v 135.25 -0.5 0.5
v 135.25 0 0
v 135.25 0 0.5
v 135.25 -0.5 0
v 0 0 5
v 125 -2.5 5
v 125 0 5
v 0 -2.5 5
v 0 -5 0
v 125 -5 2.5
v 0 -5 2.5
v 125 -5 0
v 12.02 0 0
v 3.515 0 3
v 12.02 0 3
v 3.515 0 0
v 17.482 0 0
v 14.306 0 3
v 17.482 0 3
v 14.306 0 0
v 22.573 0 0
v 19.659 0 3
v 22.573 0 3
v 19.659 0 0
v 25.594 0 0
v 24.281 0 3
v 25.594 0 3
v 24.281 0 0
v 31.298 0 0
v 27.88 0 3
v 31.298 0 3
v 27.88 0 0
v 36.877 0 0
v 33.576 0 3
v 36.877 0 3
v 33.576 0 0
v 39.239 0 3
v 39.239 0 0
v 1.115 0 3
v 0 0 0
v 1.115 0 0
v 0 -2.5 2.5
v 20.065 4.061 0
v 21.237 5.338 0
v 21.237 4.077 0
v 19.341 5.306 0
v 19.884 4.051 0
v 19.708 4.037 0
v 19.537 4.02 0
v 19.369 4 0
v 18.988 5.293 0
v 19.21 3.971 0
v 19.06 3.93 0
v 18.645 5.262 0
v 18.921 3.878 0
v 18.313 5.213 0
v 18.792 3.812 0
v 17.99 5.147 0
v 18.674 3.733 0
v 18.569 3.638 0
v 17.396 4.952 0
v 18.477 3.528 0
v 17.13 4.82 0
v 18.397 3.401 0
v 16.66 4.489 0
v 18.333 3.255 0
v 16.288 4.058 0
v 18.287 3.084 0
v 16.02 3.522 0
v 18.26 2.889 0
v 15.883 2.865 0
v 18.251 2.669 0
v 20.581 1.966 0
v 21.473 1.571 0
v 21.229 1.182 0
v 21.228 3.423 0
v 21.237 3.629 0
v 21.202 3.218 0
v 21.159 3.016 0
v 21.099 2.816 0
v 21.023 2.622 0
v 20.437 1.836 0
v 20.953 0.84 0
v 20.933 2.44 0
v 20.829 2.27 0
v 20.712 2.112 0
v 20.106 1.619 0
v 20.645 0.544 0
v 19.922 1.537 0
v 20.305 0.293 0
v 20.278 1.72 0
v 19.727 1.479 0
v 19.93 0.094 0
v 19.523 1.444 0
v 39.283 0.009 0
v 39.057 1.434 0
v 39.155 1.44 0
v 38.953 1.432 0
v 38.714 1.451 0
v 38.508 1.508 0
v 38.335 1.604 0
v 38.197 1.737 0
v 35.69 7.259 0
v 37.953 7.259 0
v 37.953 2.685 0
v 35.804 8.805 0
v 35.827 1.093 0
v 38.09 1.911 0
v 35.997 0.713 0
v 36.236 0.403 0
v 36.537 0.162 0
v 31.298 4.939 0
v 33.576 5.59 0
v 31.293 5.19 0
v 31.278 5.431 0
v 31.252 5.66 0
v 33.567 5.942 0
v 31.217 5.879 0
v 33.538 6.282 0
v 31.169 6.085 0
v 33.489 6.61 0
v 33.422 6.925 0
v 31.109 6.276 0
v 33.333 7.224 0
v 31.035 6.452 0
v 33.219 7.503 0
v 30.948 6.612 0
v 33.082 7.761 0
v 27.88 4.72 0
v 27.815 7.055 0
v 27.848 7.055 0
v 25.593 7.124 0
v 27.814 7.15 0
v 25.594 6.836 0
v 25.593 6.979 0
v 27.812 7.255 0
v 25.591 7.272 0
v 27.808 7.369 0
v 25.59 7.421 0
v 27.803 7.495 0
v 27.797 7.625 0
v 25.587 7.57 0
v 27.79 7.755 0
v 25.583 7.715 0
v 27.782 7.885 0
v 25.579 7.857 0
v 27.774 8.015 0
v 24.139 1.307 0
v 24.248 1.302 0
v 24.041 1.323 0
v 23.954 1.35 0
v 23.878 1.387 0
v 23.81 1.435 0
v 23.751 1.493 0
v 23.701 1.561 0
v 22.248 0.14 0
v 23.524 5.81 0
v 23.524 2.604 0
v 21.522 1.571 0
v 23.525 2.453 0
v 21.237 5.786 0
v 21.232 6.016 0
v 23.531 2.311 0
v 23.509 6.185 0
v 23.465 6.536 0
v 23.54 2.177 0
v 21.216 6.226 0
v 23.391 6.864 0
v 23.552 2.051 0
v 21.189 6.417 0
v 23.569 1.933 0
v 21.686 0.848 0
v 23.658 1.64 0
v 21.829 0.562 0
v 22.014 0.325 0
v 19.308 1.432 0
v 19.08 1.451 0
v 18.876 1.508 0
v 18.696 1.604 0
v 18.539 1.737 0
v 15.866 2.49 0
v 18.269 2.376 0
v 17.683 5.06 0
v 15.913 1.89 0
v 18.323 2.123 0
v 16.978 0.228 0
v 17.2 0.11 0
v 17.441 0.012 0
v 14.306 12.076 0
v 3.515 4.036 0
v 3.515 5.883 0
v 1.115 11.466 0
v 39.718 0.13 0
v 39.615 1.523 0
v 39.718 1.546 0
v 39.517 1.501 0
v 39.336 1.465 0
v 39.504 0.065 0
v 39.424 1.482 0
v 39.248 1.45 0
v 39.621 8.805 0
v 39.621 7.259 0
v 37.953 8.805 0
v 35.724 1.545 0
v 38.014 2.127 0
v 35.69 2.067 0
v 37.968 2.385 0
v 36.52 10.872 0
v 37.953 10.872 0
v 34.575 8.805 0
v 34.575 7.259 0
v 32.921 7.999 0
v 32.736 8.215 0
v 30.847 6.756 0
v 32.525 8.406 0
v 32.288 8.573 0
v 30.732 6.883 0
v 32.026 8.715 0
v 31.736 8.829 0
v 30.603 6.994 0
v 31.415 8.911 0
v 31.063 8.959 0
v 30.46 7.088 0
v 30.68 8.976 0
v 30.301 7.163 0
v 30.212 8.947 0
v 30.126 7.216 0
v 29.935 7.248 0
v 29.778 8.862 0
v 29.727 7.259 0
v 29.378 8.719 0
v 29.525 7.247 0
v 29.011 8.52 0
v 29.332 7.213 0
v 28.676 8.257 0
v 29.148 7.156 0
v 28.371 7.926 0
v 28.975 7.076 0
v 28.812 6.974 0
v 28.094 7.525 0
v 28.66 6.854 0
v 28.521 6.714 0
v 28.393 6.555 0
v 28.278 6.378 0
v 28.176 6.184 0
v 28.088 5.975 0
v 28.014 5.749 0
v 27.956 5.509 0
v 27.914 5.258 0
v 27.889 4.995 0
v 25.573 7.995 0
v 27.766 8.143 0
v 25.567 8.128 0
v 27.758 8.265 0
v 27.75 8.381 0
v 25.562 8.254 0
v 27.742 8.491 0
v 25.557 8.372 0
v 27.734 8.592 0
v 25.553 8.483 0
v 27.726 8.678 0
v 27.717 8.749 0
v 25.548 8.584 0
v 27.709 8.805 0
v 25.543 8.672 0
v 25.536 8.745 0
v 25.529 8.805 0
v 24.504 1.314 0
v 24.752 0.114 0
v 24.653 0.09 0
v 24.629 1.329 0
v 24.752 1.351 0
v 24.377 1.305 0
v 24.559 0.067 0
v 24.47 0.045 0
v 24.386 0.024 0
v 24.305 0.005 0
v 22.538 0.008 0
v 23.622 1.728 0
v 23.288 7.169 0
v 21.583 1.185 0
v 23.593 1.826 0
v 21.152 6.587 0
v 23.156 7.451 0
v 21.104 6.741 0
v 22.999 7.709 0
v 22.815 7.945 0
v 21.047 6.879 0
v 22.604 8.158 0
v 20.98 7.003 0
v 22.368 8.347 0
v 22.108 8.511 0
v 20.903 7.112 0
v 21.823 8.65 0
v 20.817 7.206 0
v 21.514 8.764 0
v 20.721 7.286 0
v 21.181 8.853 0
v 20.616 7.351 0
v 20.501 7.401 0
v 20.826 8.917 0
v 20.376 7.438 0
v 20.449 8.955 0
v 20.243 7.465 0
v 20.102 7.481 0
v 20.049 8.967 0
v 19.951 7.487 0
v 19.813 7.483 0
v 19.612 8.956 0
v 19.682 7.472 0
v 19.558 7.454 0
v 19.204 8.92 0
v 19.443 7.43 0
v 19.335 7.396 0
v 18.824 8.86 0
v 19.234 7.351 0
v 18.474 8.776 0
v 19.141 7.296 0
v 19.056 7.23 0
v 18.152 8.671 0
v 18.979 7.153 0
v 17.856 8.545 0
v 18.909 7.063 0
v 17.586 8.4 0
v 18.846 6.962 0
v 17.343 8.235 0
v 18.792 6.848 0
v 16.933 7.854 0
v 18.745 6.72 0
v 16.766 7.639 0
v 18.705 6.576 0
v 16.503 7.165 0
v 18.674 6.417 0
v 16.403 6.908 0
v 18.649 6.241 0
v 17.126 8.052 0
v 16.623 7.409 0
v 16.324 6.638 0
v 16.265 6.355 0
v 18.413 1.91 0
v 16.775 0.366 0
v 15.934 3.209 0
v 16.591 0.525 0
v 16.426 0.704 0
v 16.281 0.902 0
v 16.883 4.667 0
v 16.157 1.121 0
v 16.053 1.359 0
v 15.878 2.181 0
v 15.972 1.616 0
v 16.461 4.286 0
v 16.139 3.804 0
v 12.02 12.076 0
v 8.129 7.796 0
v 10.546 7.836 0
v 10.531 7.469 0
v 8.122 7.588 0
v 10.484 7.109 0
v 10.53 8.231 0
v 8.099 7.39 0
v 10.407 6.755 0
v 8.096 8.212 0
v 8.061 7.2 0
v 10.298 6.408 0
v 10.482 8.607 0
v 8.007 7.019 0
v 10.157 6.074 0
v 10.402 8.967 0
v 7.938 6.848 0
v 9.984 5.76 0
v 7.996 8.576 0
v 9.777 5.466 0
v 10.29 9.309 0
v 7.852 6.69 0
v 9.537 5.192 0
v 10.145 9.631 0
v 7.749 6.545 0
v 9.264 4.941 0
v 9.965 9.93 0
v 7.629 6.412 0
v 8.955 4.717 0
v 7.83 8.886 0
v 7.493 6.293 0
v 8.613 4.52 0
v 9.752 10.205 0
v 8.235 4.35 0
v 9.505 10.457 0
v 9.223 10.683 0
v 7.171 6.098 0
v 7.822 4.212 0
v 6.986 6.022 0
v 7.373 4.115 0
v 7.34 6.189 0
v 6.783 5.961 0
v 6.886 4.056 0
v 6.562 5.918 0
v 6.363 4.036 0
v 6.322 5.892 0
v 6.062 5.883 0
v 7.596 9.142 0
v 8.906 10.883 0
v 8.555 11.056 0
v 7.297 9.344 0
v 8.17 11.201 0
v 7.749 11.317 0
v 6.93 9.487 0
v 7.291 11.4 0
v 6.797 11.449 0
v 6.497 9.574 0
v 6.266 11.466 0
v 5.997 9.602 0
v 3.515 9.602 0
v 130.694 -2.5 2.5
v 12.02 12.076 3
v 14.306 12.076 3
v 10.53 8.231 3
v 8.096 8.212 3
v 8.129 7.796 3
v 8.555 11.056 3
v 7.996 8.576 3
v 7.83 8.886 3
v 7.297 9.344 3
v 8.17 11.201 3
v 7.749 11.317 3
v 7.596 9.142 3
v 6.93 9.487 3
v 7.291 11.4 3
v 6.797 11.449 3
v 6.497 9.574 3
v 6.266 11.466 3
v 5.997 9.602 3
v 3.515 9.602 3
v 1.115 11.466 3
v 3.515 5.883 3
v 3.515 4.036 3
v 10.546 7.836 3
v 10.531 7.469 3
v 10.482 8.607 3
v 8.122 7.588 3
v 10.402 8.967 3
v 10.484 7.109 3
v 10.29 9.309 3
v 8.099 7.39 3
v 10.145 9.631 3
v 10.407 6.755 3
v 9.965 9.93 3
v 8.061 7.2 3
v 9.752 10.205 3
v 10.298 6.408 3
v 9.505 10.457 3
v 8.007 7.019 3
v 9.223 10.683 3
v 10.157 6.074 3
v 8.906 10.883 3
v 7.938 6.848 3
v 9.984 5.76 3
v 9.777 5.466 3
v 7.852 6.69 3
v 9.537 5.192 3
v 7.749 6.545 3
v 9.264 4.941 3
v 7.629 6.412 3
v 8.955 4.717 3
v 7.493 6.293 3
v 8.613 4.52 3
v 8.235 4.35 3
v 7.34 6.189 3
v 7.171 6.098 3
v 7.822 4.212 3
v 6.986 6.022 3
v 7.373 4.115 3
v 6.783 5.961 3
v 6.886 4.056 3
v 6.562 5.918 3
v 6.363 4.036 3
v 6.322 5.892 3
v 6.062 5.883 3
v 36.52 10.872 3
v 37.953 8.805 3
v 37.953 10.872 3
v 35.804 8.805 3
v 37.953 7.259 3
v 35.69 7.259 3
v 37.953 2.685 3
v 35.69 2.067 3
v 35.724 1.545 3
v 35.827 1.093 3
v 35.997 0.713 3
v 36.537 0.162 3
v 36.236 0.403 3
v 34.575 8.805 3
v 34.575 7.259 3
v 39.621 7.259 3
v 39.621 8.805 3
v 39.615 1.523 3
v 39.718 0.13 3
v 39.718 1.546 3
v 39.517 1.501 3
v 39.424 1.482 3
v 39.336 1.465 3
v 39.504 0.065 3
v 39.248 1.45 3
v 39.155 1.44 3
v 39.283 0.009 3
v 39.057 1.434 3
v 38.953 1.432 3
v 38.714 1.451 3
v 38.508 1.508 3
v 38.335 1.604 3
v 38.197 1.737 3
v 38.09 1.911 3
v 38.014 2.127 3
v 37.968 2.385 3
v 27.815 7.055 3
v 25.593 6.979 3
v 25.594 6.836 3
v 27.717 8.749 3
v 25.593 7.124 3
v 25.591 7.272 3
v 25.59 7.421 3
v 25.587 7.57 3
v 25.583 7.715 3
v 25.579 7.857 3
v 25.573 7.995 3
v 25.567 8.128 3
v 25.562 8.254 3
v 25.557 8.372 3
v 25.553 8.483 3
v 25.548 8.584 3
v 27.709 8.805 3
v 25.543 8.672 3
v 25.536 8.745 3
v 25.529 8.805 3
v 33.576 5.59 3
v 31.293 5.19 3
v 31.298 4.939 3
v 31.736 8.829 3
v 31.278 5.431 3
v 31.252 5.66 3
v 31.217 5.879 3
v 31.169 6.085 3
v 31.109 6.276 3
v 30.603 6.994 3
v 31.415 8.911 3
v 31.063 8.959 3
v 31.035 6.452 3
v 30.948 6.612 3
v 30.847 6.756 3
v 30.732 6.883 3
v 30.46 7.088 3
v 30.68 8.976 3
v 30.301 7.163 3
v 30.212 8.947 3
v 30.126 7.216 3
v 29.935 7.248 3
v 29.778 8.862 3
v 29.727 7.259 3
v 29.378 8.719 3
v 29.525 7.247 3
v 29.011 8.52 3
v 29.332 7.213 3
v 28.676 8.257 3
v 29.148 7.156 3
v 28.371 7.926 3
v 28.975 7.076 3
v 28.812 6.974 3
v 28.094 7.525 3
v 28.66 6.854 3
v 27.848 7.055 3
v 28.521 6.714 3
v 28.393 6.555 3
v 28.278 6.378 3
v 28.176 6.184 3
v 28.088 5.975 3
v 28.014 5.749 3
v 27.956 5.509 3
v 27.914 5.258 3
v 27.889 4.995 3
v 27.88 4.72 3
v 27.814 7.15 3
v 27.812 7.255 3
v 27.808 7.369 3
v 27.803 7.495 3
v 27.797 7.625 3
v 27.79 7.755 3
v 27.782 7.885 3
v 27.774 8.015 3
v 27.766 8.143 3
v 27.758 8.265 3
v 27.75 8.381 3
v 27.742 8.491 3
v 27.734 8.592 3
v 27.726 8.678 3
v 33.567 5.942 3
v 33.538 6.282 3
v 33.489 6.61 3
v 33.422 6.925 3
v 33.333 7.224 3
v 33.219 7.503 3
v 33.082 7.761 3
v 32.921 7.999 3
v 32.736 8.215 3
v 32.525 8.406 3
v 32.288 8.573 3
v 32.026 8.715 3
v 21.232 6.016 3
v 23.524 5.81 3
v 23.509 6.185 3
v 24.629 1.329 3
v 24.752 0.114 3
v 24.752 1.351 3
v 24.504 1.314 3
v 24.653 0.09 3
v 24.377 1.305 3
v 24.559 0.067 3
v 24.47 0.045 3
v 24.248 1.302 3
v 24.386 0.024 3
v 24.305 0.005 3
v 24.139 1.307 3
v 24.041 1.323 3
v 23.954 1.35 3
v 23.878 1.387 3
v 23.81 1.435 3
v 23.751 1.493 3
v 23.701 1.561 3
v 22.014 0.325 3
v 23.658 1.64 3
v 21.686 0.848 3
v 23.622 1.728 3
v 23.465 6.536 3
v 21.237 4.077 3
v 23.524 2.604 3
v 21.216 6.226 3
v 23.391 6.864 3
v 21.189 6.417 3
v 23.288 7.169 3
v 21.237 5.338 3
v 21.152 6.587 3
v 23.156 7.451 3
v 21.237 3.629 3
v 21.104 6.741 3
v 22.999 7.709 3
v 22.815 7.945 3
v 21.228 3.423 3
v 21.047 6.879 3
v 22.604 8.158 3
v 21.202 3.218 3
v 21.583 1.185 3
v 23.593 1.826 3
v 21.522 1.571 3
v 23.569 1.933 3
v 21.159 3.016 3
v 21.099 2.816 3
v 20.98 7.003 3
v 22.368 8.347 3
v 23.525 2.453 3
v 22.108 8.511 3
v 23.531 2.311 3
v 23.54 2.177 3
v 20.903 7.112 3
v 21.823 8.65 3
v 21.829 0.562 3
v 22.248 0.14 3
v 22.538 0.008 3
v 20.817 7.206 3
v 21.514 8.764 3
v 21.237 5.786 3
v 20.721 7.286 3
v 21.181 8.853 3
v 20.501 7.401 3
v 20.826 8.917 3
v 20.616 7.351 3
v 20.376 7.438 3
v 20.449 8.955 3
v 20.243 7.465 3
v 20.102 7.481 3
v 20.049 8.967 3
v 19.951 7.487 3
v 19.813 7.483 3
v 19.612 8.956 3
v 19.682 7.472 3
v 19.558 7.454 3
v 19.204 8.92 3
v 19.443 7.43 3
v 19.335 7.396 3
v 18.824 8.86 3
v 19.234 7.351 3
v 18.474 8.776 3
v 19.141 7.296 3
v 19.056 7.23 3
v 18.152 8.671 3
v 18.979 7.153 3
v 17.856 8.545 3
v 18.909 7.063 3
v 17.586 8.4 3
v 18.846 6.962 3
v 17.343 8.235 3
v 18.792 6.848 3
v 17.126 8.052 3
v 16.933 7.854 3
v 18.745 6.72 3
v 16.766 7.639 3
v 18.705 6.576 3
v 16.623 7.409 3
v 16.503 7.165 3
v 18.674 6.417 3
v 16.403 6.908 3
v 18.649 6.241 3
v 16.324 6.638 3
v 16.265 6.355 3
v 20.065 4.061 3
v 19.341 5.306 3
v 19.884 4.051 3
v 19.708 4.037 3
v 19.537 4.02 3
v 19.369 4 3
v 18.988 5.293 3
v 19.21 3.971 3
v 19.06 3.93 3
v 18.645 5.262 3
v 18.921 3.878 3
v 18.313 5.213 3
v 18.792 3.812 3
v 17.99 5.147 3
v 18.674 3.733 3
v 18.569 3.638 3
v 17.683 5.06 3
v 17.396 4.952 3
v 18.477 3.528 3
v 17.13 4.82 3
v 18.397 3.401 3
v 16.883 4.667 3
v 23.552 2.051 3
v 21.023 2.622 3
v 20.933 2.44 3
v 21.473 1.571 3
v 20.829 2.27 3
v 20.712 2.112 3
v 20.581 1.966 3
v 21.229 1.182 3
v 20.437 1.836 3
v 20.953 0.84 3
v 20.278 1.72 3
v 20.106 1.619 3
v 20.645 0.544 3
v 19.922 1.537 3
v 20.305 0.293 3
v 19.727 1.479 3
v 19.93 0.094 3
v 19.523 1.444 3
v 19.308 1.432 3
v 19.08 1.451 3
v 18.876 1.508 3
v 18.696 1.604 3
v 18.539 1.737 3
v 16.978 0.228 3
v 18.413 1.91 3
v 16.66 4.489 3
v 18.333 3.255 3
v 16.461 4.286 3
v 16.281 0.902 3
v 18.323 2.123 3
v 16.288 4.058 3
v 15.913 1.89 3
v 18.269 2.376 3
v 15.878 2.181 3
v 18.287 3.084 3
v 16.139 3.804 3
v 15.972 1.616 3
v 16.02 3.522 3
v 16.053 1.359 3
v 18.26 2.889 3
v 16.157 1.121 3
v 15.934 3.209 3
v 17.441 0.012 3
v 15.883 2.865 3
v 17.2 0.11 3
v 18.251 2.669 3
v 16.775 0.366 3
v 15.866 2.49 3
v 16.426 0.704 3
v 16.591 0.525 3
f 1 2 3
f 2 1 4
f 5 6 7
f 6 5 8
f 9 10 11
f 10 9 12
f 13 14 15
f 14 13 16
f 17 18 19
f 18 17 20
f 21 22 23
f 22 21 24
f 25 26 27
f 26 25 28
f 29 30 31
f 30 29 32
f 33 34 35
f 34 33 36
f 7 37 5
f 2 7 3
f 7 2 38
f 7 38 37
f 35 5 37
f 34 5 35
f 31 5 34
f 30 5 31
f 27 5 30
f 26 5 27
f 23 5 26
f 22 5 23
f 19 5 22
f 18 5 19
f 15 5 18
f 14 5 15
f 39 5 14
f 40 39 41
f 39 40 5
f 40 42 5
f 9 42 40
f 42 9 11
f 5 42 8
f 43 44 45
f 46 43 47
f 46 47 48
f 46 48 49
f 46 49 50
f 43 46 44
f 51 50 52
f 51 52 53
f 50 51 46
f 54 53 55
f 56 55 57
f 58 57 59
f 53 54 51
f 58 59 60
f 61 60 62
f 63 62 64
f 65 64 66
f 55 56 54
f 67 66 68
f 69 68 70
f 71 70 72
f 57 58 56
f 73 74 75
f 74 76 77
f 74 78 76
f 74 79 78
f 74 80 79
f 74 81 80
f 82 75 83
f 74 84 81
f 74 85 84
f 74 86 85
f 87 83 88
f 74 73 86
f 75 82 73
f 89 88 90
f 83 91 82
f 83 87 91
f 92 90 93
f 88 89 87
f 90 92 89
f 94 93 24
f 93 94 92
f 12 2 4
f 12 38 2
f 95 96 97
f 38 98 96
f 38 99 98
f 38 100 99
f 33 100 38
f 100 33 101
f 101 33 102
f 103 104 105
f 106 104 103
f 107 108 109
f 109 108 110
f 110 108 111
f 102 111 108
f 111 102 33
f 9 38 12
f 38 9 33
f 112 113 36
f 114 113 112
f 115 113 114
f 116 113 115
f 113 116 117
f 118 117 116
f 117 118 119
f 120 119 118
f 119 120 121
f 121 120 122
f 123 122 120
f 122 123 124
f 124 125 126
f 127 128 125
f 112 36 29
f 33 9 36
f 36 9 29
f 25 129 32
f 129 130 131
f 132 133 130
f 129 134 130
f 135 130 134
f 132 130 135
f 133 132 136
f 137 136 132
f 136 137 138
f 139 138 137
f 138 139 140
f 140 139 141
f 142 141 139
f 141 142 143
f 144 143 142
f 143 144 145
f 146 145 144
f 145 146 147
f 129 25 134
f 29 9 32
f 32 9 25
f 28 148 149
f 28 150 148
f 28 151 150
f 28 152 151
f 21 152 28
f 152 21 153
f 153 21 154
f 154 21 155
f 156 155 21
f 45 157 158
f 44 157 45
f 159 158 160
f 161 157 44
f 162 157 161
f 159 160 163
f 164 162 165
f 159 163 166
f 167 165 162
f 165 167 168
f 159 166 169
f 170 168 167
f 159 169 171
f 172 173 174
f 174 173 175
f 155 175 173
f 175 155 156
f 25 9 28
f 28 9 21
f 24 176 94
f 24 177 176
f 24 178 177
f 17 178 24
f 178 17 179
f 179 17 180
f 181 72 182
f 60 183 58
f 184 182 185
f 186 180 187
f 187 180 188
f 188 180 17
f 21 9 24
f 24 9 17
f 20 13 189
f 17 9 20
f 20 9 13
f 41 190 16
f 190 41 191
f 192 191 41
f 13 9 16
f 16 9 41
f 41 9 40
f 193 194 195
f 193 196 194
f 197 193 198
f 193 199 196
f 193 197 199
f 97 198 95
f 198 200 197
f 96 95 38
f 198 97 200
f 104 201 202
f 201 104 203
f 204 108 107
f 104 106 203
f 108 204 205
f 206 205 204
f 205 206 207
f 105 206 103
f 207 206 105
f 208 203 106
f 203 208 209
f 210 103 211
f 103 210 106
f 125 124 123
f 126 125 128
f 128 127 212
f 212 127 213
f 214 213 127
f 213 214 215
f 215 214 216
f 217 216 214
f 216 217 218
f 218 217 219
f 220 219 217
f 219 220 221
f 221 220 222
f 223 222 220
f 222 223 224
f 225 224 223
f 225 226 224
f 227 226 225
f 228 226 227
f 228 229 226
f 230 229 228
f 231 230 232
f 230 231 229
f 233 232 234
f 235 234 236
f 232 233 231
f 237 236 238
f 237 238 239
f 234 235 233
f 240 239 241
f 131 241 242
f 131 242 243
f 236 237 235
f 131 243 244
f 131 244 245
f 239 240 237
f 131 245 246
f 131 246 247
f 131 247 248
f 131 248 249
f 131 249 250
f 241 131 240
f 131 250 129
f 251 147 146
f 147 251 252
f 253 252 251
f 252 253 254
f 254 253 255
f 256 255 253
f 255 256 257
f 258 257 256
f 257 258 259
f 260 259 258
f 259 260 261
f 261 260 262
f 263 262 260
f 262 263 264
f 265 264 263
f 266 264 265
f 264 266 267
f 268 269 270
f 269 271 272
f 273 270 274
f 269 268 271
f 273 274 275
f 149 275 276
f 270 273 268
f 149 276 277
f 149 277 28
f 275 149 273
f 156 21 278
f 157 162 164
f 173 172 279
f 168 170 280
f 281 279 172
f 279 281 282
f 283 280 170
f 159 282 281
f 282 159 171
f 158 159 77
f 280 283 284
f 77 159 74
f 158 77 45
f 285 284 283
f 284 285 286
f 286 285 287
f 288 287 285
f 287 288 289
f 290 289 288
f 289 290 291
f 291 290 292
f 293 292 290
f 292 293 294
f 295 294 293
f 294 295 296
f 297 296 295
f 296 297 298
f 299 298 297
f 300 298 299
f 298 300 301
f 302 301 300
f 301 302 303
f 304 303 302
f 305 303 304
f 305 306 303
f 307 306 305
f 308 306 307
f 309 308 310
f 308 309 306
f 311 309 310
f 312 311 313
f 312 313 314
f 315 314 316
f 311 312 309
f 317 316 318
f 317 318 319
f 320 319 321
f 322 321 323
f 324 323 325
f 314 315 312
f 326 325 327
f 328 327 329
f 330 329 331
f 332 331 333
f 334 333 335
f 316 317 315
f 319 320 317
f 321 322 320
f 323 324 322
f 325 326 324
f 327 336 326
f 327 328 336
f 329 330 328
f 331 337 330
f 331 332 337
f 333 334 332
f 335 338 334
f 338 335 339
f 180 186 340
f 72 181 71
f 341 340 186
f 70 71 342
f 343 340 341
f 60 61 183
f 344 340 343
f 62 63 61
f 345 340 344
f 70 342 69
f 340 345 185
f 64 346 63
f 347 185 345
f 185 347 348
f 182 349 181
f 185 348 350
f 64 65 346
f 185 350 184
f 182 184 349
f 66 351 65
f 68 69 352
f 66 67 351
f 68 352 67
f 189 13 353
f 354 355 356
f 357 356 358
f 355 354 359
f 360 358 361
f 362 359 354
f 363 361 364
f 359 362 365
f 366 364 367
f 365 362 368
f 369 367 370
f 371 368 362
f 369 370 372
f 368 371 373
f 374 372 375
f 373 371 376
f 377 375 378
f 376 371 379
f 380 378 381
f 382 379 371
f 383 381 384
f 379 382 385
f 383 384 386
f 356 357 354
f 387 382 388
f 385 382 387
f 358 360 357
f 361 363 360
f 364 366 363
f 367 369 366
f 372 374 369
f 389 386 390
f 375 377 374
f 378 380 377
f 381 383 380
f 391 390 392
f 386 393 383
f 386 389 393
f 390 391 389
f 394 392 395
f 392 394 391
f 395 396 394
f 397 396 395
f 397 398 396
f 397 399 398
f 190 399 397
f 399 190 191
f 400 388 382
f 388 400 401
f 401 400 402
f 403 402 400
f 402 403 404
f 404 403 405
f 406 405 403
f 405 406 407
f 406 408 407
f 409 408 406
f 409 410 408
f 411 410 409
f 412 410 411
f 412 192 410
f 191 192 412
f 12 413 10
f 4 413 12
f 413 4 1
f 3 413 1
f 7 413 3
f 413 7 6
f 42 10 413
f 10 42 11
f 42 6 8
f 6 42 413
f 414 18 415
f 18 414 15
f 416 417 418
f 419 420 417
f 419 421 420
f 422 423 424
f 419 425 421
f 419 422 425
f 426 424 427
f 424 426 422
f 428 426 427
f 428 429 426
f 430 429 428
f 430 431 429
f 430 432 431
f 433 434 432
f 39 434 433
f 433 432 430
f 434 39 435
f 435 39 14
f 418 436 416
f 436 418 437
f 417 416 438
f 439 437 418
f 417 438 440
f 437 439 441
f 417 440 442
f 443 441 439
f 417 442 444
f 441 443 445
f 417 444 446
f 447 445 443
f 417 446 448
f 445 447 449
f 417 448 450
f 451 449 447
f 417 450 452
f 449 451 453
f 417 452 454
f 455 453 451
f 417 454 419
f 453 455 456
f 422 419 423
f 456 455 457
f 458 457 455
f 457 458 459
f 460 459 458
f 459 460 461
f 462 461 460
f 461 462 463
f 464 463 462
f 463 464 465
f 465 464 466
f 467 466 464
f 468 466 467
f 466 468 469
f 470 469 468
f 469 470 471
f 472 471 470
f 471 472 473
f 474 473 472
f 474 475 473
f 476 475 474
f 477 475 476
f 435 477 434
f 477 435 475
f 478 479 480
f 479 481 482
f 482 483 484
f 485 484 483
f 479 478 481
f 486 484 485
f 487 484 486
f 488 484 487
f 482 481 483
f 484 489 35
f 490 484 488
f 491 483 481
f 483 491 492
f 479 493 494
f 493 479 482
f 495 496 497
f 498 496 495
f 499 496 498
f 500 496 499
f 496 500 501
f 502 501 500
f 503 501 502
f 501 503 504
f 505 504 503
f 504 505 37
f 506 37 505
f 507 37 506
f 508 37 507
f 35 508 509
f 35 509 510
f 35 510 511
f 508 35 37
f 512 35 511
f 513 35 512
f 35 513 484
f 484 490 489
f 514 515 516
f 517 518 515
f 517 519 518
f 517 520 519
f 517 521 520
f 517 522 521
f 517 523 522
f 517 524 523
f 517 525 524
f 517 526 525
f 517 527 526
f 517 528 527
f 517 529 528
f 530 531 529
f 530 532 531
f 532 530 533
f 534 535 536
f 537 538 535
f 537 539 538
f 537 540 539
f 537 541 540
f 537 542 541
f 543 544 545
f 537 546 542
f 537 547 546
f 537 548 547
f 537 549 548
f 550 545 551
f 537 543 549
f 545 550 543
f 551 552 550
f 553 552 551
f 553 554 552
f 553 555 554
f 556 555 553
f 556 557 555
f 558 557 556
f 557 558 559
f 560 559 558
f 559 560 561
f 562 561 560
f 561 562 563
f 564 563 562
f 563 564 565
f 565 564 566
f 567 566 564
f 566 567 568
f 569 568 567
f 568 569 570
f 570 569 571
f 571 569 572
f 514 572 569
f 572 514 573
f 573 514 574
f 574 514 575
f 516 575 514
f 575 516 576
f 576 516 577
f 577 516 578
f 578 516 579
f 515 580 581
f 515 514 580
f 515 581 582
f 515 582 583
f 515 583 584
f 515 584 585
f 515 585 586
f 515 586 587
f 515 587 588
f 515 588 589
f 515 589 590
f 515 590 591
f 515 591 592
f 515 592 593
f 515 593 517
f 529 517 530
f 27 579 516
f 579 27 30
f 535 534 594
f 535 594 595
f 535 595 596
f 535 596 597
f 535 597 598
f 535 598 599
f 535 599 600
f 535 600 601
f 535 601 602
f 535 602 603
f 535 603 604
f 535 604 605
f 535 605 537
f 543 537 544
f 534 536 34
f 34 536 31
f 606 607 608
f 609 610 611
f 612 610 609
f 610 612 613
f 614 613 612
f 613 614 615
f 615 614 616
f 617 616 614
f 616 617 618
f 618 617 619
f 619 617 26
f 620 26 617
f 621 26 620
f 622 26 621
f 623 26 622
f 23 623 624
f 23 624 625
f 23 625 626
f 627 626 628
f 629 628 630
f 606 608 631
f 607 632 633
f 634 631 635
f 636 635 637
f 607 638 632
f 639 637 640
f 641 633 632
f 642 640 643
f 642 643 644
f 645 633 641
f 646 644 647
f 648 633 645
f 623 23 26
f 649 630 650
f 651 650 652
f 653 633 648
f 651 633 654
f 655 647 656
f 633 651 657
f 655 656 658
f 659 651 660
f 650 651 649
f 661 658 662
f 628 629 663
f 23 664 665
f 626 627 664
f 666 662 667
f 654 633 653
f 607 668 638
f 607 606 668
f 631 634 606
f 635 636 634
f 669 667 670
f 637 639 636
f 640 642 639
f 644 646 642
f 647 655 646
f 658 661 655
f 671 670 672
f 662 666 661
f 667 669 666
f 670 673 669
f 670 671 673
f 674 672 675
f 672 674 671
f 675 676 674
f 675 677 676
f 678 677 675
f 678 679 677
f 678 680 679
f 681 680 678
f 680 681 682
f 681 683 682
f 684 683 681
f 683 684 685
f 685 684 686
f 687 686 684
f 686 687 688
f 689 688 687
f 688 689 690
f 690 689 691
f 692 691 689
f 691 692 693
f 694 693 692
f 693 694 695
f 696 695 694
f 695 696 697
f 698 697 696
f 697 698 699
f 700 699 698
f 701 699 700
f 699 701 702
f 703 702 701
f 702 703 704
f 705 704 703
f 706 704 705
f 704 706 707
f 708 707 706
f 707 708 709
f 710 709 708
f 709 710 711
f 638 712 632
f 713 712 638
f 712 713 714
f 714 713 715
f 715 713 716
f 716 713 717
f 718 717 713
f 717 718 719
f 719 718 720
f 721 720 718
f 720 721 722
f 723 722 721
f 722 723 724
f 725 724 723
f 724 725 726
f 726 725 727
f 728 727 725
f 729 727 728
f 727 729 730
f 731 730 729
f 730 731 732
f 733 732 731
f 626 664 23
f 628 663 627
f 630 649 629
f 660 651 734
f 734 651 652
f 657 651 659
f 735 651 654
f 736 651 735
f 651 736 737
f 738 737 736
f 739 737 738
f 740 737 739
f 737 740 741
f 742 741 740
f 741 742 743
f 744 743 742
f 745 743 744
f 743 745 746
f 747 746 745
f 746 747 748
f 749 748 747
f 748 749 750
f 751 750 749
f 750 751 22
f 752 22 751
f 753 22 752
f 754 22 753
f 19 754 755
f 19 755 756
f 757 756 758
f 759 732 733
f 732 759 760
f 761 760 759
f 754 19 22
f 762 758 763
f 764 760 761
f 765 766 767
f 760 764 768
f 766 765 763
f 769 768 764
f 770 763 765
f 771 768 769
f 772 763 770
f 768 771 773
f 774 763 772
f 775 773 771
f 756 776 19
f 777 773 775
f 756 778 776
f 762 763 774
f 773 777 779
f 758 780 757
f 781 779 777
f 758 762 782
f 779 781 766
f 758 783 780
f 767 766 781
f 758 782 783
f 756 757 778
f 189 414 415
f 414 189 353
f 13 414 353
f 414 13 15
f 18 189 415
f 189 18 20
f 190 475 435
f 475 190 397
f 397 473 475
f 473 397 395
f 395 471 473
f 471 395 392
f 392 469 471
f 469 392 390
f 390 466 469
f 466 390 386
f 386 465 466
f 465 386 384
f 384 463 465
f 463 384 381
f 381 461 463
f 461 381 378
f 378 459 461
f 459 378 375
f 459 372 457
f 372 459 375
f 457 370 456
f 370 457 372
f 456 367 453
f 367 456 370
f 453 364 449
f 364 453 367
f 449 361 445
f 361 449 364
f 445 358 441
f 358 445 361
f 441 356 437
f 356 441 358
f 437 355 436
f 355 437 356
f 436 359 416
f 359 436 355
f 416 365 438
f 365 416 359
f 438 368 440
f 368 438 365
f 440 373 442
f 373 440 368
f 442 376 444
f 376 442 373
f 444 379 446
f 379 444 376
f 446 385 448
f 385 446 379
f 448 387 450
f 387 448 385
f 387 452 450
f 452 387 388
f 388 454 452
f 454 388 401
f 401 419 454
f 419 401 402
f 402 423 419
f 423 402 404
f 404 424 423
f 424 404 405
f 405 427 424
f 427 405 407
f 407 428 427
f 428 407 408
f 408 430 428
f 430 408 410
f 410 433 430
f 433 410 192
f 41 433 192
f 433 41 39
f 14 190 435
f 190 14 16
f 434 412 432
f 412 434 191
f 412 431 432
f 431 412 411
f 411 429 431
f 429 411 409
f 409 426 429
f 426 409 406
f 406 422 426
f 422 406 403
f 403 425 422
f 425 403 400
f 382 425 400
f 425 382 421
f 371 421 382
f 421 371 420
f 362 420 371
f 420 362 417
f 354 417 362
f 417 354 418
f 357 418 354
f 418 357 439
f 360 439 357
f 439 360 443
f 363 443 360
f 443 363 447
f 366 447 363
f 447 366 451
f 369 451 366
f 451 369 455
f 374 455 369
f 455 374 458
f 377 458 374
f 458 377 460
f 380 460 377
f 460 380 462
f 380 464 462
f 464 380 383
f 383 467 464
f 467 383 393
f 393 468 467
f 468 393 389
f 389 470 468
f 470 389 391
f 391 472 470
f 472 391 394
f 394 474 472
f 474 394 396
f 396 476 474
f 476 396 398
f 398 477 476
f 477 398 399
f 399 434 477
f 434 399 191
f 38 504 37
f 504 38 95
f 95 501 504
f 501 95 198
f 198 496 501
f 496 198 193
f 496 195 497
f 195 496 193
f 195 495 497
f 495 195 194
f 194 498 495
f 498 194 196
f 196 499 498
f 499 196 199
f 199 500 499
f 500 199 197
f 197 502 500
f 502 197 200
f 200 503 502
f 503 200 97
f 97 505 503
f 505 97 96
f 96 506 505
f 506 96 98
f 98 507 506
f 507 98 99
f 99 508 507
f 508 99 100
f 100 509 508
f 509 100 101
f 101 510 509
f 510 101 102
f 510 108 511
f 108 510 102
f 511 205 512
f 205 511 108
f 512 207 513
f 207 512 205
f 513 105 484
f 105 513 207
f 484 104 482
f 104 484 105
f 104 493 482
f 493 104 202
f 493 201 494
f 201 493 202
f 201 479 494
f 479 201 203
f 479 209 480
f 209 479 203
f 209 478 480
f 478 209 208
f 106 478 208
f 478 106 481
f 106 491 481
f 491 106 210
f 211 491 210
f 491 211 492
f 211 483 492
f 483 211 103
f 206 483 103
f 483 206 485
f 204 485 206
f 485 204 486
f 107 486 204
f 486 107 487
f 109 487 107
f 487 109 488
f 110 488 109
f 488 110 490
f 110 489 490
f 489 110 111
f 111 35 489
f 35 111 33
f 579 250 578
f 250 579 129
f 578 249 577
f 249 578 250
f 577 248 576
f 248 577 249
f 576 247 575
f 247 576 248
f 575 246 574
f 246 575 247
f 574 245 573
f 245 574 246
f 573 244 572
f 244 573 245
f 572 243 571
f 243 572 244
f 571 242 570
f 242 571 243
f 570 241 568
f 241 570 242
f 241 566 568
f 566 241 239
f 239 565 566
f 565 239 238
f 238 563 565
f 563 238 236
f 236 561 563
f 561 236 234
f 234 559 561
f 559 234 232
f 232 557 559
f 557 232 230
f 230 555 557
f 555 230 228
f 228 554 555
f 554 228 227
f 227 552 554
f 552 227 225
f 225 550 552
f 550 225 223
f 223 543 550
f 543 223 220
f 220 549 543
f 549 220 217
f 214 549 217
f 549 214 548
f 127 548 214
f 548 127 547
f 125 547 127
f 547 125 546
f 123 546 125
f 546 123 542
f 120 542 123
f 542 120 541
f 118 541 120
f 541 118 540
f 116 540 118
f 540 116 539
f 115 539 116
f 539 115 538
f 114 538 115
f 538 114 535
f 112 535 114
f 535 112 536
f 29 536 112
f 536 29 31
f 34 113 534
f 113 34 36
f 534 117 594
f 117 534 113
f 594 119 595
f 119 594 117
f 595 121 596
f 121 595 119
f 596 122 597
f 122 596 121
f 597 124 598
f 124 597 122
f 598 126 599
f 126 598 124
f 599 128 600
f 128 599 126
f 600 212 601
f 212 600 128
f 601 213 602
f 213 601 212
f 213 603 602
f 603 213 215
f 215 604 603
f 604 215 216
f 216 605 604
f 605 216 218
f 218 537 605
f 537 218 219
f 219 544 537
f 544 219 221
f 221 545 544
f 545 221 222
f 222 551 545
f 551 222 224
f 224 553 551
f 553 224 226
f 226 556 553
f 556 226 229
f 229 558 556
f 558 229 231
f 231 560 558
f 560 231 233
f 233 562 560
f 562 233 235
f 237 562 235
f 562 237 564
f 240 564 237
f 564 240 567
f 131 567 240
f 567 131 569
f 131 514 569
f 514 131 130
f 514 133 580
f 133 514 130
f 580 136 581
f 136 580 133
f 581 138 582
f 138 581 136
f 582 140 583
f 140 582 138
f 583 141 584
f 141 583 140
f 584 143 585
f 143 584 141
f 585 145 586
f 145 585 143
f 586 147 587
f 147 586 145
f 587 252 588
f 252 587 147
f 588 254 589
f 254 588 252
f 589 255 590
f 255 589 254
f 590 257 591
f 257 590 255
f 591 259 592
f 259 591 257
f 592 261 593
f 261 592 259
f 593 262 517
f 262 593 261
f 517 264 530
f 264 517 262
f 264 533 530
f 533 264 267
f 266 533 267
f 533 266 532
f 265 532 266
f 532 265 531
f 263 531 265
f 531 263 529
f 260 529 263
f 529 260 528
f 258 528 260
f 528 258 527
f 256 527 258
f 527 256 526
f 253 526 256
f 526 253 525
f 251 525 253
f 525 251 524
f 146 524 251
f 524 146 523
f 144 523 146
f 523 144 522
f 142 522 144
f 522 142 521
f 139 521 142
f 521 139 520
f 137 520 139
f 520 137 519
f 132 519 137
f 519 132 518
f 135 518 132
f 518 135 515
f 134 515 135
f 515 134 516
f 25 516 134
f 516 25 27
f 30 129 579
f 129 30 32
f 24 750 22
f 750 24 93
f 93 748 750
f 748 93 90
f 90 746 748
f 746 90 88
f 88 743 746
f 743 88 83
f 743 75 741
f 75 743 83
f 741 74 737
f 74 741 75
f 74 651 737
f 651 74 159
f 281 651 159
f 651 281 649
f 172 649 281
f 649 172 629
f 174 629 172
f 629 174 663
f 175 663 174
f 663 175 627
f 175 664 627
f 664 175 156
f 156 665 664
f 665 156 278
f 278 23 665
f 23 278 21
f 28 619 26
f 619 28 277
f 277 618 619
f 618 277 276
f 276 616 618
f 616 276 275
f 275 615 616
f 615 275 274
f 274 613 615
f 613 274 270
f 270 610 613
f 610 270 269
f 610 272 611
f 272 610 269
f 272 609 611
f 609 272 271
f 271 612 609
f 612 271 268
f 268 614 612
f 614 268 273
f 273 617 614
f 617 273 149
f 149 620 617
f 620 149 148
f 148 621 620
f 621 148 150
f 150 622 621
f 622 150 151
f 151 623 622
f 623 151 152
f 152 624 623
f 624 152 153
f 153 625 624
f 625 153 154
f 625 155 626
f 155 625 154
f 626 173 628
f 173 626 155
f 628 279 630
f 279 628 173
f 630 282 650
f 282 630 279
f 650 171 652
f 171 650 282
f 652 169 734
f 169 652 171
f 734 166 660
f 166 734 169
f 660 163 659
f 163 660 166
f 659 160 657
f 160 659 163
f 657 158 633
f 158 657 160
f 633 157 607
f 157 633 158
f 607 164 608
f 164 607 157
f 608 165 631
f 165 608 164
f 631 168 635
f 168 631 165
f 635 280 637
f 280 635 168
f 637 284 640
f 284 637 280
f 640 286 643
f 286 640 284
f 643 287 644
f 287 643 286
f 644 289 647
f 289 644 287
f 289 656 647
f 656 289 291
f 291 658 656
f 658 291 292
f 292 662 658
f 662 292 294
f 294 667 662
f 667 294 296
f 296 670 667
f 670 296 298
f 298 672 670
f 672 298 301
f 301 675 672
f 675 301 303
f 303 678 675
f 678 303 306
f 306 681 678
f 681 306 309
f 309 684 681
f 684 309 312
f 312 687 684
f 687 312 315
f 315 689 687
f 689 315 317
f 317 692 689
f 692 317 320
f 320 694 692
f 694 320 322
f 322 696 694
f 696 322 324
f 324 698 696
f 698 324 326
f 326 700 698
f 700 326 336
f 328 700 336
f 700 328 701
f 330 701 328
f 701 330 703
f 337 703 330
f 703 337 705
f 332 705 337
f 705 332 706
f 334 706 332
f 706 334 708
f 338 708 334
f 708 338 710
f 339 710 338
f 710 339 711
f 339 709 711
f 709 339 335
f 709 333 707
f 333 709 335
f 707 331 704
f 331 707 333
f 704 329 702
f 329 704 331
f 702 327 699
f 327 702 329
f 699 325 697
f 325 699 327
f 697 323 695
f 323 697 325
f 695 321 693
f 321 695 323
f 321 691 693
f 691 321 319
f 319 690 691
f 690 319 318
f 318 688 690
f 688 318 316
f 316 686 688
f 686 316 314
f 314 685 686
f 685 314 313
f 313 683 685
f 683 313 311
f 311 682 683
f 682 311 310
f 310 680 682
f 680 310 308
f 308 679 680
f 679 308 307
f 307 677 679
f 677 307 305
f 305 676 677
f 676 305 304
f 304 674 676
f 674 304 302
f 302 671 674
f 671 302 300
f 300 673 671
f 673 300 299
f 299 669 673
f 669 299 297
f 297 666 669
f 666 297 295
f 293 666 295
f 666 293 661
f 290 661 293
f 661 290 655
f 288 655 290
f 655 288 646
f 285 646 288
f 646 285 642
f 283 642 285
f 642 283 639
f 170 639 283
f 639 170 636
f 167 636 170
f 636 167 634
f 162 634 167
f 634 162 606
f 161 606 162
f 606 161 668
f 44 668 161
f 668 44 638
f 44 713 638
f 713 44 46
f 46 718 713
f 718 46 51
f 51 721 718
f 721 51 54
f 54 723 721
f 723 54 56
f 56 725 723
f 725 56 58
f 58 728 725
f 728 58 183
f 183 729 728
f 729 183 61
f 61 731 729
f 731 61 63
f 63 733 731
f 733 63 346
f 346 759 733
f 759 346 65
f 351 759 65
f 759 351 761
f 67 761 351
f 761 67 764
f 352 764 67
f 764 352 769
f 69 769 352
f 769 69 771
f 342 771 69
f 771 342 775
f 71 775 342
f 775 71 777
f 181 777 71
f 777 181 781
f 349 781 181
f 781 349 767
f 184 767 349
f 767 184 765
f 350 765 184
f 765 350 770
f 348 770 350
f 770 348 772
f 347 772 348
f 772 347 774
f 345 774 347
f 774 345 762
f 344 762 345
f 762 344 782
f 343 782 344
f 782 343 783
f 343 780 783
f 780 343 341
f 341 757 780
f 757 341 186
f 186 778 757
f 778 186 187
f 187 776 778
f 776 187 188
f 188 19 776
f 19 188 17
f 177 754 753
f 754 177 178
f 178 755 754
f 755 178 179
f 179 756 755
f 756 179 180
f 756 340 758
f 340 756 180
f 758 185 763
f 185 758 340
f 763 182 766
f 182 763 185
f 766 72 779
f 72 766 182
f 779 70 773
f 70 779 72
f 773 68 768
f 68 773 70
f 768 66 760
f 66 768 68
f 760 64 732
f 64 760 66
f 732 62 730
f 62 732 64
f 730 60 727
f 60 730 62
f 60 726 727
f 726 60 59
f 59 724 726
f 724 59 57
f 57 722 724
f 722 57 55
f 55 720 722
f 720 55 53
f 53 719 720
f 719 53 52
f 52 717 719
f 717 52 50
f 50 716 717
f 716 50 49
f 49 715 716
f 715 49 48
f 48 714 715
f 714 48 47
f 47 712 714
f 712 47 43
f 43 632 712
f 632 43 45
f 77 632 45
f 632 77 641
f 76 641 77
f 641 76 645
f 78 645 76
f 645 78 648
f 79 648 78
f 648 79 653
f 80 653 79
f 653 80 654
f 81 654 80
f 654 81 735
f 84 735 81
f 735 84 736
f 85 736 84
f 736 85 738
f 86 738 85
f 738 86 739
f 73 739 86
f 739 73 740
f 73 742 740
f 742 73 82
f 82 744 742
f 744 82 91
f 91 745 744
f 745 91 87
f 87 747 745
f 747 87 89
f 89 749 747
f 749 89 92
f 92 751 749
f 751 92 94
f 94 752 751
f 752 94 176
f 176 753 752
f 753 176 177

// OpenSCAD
// Customizable Garden Plant Label Stake
// by Mark Thompson

text_string = "Plant";
text_size = 12;
text_thickness = 3;
text_font = "Nimbus Sans L:Bold";
text_y_offset_adjust = 0;

stake_length = 125;
stake_thickness = 5;
stake_height = 5;

point_length = 10;
tip_size = 0.5;

{
    translate([0,text_y_offset_adjust,0])
        linear_extrude(height=text_thickness, convexity=4)
            text(text_string,size=text_size,font=text_font);

    translate([stake_length/2,-stake_height/2,stake_thickness/2]) {
        difference() {
            hull() {
                cube([stake_length,stake_height,stake_thickness],true);
                translate([stake_length/2+point_length,stake_height/2-tip_size/2,-stake_thickness/2+tip_size/2])
                    cube([tip_size,tip_size,tip_size],true);
            }
            
            translate([0,-stake_height/2,stake_thickness/2])
                cube([stake_length+point_length*2+0.1,stake_height,stake_thickness],true);
        }
    }
}
